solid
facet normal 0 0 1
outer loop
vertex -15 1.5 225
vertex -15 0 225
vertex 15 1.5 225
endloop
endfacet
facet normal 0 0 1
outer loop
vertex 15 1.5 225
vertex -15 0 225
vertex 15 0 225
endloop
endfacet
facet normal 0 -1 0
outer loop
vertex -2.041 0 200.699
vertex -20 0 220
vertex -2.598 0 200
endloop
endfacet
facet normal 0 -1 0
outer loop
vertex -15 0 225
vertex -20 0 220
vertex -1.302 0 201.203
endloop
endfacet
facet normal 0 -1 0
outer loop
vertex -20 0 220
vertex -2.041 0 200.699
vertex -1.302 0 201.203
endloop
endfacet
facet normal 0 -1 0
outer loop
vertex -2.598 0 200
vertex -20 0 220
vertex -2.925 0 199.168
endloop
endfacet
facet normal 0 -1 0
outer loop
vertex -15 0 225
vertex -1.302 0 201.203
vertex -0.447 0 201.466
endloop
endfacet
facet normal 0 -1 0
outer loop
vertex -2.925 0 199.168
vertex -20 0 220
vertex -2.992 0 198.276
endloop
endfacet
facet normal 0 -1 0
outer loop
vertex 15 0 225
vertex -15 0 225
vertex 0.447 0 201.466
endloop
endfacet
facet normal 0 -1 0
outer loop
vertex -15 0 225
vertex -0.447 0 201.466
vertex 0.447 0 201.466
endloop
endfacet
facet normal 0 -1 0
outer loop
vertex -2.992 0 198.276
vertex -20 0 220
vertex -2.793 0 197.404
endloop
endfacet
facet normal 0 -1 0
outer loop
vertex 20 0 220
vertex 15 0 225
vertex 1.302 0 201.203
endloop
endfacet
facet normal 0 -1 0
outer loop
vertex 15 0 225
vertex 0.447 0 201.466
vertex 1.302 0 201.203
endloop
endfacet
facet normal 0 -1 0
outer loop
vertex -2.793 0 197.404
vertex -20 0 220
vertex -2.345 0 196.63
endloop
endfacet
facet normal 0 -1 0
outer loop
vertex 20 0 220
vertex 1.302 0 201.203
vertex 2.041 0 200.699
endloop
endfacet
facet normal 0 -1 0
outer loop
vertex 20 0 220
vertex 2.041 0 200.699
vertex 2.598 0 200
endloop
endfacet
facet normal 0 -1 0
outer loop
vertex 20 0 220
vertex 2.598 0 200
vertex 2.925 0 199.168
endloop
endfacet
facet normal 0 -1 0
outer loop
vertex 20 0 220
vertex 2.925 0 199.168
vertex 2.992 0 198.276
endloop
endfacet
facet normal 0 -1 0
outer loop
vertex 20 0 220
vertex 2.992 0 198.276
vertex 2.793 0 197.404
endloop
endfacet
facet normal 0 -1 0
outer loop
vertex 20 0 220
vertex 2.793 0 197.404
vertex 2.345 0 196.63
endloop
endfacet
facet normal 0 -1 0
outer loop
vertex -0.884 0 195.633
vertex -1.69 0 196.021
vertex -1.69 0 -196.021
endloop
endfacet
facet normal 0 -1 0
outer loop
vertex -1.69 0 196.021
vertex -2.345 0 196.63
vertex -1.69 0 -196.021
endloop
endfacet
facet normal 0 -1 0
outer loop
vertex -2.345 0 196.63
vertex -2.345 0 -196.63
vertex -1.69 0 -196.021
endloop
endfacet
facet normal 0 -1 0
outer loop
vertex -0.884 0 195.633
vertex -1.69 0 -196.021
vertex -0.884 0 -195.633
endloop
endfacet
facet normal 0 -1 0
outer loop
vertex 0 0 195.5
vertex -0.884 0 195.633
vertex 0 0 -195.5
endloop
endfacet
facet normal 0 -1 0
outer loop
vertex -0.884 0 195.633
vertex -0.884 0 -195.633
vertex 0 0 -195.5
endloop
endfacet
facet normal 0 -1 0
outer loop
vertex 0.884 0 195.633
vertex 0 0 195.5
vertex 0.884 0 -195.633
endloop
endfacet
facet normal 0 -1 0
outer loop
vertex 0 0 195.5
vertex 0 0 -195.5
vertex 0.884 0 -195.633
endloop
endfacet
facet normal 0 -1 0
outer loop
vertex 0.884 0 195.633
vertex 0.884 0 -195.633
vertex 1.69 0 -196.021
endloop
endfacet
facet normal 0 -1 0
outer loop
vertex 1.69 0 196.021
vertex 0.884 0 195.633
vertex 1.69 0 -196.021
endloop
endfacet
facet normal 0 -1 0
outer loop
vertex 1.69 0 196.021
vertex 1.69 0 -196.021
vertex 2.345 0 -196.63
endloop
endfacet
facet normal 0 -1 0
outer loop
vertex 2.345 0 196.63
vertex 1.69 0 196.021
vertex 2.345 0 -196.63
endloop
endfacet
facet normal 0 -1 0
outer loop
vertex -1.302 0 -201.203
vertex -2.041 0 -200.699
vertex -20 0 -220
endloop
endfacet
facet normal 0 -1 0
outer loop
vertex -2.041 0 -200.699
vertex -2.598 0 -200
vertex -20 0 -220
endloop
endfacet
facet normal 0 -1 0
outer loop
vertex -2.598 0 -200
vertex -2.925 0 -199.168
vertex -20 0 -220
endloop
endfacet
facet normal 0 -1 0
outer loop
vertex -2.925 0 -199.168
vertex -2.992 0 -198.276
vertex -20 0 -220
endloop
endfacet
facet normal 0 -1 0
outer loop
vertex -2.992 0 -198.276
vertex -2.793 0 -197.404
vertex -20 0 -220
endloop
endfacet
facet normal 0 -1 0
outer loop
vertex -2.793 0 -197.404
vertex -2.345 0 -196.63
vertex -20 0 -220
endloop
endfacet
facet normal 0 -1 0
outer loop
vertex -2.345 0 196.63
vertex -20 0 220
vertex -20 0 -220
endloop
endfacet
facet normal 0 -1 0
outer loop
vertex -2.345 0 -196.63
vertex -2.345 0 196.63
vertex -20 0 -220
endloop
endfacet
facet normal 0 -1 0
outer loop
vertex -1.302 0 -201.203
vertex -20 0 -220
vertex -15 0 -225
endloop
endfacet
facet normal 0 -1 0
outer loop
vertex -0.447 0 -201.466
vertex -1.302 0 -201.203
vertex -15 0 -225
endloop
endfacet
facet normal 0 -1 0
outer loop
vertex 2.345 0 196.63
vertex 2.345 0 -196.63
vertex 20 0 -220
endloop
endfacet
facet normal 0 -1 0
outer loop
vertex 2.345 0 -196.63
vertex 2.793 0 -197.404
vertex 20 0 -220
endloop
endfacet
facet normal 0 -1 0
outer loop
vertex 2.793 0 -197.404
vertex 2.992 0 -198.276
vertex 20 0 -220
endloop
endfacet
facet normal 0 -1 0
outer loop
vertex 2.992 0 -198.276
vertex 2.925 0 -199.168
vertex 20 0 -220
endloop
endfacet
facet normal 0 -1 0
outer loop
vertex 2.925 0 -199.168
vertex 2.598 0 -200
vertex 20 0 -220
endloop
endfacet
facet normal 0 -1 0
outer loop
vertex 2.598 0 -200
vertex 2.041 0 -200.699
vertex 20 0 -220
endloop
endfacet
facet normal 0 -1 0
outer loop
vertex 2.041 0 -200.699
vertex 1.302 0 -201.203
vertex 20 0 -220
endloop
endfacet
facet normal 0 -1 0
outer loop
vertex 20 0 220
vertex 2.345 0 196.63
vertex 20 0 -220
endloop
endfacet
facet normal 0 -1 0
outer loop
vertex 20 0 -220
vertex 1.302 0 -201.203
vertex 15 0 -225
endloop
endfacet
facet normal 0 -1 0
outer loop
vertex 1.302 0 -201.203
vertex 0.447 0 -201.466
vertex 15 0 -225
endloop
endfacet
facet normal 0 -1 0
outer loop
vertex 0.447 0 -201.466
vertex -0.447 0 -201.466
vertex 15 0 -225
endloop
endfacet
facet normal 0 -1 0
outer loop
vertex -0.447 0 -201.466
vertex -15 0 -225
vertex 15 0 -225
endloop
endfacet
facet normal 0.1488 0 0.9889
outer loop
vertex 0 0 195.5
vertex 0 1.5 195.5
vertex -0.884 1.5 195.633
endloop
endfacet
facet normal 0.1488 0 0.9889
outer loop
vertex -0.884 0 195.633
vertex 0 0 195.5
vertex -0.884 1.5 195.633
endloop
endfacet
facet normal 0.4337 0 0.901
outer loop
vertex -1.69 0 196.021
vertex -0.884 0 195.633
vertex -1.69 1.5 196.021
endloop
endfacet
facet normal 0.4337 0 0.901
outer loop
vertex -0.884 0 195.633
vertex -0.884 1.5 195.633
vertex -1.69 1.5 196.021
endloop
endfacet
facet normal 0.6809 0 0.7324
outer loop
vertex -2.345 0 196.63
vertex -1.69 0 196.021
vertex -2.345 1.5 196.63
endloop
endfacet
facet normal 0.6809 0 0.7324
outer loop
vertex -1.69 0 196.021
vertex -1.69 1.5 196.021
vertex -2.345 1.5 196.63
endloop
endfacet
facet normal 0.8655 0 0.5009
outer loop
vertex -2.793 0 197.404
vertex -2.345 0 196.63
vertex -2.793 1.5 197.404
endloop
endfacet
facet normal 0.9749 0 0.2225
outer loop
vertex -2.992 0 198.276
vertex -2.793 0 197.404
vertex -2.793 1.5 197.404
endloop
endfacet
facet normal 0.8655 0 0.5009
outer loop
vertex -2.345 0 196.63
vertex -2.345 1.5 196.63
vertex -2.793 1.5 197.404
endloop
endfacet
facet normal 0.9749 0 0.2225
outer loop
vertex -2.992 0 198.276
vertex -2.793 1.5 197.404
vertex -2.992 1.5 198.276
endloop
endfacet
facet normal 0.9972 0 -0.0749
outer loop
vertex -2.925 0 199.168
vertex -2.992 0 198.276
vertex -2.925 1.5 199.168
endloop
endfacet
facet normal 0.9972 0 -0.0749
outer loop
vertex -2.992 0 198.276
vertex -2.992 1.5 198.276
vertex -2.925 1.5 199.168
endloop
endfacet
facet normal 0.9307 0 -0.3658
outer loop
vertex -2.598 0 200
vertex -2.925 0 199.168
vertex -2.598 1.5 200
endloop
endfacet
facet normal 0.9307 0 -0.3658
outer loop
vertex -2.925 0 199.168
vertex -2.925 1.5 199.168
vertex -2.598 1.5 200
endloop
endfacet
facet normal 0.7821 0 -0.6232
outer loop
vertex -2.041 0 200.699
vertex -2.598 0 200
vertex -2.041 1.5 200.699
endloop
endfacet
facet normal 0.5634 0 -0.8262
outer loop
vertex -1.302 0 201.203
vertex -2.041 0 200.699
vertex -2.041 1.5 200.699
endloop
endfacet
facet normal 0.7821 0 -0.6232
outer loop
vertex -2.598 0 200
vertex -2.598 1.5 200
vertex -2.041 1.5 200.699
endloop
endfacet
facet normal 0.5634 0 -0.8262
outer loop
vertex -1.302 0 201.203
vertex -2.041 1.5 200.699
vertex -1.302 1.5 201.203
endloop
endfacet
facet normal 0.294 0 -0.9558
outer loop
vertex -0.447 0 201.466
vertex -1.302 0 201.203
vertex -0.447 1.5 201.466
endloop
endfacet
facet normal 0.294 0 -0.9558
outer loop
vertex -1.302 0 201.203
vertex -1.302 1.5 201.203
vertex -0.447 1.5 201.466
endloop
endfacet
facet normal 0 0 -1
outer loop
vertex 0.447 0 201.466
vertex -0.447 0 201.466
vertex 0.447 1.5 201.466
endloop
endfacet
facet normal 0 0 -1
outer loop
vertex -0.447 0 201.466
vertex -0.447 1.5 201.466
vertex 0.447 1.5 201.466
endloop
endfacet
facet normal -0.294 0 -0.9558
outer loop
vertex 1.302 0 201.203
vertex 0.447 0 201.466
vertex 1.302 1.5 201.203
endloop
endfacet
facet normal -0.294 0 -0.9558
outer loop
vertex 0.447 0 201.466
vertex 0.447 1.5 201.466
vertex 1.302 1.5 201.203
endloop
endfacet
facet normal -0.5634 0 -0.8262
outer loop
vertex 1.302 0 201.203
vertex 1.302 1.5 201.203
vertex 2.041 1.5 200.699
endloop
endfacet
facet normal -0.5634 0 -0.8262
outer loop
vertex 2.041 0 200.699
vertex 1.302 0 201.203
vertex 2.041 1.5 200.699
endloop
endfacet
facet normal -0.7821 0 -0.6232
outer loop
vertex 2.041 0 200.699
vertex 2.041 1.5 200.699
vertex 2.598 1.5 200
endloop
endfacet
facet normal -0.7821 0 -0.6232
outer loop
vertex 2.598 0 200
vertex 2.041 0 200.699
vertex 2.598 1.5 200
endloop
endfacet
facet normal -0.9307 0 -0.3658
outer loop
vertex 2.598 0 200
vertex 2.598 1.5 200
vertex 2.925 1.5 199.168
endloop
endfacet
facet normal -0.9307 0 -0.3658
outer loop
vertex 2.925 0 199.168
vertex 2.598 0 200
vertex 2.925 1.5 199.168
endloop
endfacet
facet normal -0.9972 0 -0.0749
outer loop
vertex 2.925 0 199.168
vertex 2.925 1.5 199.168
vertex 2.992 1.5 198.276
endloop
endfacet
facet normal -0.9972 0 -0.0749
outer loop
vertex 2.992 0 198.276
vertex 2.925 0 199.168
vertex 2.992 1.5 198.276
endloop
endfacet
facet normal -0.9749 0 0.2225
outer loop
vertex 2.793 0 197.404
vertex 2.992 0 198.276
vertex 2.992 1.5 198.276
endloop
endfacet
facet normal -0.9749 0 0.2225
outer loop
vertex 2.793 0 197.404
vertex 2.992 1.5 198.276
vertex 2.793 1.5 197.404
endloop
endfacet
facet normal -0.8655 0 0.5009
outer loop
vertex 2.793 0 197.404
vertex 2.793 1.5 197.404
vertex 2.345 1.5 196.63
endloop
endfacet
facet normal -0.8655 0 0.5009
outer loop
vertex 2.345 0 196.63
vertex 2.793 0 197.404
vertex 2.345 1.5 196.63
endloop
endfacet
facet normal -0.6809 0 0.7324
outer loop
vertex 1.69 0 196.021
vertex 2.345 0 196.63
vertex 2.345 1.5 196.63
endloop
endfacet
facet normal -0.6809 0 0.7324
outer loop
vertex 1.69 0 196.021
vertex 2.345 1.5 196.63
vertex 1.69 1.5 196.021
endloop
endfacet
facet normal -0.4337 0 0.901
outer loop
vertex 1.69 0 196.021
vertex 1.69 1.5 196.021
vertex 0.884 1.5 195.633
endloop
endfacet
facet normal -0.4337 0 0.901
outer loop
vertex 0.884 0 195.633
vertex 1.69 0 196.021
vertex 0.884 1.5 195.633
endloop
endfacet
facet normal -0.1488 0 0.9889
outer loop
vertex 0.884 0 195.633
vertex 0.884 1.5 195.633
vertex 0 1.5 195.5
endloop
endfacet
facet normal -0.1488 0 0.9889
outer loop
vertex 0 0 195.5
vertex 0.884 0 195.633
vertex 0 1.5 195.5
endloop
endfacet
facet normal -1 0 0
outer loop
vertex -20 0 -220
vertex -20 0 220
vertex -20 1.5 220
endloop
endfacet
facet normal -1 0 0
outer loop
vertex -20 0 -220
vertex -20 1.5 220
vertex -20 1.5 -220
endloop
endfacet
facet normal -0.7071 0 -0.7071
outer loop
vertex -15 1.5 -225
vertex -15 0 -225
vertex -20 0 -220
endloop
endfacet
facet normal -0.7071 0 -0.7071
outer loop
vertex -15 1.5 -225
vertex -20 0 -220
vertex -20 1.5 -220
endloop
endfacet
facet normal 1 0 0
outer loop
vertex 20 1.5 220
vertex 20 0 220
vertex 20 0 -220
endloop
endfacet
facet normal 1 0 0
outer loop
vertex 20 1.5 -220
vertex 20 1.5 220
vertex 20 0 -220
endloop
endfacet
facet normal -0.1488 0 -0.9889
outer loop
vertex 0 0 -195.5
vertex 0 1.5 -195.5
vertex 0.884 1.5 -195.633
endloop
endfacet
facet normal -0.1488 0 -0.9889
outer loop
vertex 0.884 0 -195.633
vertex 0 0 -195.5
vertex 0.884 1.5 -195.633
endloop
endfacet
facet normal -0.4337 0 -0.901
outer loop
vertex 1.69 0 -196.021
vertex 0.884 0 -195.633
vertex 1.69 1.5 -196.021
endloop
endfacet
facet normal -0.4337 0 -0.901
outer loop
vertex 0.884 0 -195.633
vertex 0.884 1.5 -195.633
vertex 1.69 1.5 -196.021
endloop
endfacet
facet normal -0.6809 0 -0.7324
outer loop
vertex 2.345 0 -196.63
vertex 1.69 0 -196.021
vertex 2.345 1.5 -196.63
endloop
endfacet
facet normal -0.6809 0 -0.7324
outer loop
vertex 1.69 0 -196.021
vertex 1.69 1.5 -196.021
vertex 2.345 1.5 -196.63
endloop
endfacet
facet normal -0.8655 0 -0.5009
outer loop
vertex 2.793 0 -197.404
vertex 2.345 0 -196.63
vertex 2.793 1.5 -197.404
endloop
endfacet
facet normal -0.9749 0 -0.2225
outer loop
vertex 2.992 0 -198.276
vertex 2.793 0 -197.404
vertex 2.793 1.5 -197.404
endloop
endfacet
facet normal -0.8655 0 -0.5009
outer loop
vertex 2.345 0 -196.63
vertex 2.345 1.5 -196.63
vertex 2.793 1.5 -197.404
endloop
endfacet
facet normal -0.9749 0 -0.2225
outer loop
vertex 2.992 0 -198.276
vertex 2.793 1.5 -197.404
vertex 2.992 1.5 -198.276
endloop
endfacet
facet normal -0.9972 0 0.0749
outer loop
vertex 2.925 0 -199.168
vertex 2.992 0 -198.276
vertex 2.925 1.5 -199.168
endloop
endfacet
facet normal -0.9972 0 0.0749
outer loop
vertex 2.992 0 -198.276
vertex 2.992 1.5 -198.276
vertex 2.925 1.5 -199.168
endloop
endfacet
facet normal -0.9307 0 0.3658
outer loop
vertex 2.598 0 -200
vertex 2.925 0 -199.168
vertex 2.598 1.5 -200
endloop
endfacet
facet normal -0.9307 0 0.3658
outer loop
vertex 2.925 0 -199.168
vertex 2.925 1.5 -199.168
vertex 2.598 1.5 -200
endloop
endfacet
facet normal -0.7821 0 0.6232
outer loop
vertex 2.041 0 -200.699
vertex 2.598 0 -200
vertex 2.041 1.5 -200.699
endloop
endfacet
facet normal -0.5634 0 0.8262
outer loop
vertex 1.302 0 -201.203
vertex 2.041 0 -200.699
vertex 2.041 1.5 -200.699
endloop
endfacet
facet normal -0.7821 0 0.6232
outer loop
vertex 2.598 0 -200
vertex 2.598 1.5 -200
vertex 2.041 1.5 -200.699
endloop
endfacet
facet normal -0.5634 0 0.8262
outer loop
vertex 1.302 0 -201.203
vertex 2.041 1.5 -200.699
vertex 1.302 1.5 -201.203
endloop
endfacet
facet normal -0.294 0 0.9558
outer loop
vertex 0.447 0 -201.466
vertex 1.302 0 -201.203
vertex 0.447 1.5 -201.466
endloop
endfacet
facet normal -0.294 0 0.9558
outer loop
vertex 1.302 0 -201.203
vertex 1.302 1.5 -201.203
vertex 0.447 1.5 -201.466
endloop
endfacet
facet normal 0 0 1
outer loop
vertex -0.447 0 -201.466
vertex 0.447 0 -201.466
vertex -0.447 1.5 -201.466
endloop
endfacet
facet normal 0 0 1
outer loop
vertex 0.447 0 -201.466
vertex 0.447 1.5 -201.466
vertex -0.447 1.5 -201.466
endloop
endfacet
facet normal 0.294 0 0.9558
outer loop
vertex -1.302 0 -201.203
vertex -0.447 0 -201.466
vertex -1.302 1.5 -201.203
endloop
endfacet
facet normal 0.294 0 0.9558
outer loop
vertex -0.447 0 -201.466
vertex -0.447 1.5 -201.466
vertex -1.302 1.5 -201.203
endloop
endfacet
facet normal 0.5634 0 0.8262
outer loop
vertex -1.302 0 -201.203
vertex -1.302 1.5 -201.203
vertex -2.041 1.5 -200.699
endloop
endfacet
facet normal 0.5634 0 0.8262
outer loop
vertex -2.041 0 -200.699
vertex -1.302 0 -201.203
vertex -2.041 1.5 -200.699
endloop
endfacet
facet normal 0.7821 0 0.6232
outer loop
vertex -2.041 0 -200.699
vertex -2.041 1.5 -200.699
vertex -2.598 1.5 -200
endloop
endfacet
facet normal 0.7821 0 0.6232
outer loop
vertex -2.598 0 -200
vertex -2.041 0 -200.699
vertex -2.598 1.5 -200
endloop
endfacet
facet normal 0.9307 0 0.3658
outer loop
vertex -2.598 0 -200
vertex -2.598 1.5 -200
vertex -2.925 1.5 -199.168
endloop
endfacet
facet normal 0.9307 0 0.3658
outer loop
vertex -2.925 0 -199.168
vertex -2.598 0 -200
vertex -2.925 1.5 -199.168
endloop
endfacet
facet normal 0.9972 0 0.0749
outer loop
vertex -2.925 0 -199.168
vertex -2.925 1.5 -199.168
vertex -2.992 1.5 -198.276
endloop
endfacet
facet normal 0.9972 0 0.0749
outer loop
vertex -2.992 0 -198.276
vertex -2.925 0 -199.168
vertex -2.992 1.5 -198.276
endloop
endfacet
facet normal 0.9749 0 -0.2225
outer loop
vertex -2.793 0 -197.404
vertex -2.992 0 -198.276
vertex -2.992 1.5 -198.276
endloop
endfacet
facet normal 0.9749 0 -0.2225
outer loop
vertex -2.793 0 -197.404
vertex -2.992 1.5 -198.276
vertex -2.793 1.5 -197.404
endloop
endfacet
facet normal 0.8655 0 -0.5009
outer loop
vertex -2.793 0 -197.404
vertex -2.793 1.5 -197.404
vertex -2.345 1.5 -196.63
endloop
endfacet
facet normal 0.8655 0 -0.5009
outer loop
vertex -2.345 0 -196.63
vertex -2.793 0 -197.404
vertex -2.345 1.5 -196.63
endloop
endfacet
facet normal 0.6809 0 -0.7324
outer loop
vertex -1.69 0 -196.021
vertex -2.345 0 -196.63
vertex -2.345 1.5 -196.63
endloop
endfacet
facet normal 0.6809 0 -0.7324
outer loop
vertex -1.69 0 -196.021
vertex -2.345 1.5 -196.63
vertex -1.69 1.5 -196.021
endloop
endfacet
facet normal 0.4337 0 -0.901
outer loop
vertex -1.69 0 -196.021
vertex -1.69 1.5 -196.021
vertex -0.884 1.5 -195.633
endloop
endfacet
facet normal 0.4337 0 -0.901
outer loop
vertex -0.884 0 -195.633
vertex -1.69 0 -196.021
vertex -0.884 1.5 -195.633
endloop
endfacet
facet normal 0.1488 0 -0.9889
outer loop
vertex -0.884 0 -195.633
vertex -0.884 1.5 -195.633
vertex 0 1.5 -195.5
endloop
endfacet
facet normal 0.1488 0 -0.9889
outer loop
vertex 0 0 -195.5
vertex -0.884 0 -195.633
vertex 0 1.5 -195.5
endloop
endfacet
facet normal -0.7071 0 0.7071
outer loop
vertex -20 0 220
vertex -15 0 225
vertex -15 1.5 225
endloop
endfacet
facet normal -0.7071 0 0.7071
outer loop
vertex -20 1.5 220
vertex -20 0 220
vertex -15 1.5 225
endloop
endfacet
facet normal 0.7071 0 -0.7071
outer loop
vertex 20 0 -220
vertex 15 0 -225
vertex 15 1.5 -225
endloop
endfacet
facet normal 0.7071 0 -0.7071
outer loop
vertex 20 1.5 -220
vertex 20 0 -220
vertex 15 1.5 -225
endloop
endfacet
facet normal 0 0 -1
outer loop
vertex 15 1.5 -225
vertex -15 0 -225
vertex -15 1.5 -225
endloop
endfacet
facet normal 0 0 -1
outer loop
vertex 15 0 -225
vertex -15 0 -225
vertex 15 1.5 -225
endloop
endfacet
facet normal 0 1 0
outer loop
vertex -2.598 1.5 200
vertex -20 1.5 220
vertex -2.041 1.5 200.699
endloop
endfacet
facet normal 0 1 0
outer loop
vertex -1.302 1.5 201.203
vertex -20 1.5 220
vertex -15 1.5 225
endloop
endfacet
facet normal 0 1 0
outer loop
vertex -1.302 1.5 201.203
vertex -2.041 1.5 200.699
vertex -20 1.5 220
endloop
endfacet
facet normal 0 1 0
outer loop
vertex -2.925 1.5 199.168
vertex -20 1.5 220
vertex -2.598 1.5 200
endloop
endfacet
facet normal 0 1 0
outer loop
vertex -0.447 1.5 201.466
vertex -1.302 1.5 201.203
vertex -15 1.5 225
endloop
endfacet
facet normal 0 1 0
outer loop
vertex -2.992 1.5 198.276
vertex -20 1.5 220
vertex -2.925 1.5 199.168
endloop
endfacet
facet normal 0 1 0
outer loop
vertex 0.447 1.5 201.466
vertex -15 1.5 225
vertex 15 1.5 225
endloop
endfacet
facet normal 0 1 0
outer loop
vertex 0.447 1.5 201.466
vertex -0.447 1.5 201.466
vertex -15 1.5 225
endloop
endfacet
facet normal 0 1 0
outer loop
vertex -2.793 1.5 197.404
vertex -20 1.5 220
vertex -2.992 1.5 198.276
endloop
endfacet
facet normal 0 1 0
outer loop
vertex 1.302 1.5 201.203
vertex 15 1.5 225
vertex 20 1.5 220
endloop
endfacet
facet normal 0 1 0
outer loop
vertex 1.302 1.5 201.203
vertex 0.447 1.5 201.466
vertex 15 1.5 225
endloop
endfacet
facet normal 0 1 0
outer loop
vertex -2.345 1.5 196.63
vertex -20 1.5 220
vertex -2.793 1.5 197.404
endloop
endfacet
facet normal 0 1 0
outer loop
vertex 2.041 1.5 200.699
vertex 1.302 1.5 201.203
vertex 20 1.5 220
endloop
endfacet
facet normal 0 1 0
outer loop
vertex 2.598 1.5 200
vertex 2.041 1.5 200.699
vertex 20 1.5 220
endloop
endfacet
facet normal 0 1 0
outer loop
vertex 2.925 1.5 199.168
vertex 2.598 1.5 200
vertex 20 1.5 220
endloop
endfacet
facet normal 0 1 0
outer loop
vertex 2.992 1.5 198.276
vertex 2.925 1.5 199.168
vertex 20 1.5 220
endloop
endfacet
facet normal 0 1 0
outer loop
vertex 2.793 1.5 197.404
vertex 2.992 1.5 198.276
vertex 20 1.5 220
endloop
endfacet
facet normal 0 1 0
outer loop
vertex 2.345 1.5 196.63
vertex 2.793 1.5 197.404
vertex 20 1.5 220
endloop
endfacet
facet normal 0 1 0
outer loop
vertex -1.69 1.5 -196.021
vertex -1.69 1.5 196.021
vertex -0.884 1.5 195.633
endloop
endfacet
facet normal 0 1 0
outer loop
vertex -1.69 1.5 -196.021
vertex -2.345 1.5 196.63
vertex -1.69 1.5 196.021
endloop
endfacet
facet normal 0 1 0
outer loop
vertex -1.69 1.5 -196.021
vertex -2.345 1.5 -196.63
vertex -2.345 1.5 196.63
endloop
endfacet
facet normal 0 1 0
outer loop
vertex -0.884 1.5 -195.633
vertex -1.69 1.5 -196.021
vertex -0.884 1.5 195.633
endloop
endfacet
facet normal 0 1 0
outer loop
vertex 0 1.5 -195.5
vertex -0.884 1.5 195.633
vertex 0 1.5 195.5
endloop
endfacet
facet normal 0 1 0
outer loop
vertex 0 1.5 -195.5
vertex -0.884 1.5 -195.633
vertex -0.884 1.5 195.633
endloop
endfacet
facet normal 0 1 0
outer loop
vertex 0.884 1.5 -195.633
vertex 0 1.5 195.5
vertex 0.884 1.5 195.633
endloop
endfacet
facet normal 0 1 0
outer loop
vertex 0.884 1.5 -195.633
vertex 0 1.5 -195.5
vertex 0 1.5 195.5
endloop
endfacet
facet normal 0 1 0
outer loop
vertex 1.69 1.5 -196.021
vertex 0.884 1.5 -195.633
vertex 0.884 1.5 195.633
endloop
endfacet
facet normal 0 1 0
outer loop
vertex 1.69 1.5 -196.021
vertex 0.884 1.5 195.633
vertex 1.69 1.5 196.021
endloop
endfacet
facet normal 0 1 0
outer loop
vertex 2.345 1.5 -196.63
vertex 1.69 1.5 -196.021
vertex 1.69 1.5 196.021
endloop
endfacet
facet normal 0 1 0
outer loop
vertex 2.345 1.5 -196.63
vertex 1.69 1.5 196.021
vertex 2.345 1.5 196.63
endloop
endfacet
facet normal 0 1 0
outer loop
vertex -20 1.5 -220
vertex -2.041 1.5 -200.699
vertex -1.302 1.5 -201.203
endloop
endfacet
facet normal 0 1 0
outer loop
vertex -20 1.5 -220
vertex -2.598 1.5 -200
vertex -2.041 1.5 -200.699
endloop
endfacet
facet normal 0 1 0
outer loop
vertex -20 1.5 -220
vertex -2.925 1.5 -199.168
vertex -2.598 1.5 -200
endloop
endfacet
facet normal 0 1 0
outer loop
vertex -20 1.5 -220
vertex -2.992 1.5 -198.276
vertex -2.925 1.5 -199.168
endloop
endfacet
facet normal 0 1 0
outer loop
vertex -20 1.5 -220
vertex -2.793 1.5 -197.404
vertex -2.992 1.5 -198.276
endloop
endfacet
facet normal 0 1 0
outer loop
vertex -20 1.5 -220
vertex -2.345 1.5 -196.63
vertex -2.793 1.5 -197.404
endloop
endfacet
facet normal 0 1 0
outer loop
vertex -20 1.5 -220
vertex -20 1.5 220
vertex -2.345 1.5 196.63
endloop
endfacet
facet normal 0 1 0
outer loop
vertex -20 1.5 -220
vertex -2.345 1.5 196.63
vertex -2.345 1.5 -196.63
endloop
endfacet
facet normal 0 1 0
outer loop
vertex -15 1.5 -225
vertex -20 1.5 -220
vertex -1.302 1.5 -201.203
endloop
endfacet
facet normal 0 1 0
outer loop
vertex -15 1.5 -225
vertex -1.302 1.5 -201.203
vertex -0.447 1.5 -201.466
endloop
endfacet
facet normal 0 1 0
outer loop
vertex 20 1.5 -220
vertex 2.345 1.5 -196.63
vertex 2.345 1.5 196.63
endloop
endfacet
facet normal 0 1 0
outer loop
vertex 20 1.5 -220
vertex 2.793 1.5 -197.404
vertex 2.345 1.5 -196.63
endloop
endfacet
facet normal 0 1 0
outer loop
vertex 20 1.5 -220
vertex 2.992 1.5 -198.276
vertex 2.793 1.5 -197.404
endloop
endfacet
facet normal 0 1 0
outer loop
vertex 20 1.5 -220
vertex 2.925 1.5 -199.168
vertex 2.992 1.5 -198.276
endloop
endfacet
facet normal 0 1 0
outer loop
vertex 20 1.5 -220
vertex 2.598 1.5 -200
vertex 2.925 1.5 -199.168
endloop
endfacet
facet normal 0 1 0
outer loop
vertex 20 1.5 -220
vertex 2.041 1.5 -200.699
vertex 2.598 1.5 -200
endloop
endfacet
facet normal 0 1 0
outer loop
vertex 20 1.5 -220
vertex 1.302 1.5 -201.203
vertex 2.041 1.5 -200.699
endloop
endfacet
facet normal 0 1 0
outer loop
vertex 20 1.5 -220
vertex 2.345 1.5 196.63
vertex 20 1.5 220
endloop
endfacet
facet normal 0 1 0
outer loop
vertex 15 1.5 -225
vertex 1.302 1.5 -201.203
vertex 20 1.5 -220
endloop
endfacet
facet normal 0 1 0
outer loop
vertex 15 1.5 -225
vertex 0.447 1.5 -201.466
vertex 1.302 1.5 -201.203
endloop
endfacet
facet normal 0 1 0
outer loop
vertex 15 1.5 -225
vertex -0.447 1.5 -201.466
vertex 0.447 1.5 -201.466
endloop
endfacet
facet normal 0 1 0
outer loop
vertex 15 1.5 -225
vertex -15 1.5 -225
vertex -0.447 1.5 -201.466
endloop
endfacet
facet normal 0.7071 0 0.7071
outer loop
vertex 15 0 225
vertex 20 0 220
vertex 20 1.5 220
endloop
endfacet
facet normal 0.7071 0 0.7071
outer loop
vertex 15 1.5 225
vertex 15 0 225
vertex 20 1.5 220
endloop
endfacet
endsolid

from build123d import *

# Parameters (mm, degrees)
SKETCH1_W           = 40
SKETCH1_H           = 450
BOSS_EXTRUDE1_DEPTH = 1.5
CHAMFER1_SIZE       = 5
SKETCH2_R           = 3
CUT_EXTRUDE1_DEPTH  = 226.89212027


with BuildPart() as part:
    # Sketch1 → Boss-Extrude1 (new body)
    with BuildSketch(Plane(origin=(0, 0, 0), x_dir=(1, 0, 0), z_dir=(0, 1, 0))):
        Rectangle(SKETCH1_W, SKETCH1_H)
    extrude(amount=BOSS_EXTRUDE1_DEPTH)

    # Chamfer1
    chamfer1_edges = [part.edges().sort_by_distance(p)[0] for p in [
        (20, 0.75, 225),
        (-20, 0.75, 225),
        (-20, 0.75, -225),
        (20, 0.75, -225),
    ]]
    chamfer(chamfer1_edges, length=CHAMFER1_SIZE)

    # Sketch2 → Cut-Extrude1 (cut, through all)
    with BuildSketch(Plane(origin=(0, 1.5, 0), x_dir=(1, 0, 0), z_dir=(0, 1, 0))):
        with Locations(Location((0, 198.5, 0), (0, 0, 270))):
            Circle(SKETCH2_R)
        with Locations(Location((0, -198.5, 0), (0, 0, 90))):
            Circle(SKETCH2_R)
    extrude(amount=-CUT_EXTRUDE1_DEPTH, mode=Mode.SUBTRACT)


solid = part.part
